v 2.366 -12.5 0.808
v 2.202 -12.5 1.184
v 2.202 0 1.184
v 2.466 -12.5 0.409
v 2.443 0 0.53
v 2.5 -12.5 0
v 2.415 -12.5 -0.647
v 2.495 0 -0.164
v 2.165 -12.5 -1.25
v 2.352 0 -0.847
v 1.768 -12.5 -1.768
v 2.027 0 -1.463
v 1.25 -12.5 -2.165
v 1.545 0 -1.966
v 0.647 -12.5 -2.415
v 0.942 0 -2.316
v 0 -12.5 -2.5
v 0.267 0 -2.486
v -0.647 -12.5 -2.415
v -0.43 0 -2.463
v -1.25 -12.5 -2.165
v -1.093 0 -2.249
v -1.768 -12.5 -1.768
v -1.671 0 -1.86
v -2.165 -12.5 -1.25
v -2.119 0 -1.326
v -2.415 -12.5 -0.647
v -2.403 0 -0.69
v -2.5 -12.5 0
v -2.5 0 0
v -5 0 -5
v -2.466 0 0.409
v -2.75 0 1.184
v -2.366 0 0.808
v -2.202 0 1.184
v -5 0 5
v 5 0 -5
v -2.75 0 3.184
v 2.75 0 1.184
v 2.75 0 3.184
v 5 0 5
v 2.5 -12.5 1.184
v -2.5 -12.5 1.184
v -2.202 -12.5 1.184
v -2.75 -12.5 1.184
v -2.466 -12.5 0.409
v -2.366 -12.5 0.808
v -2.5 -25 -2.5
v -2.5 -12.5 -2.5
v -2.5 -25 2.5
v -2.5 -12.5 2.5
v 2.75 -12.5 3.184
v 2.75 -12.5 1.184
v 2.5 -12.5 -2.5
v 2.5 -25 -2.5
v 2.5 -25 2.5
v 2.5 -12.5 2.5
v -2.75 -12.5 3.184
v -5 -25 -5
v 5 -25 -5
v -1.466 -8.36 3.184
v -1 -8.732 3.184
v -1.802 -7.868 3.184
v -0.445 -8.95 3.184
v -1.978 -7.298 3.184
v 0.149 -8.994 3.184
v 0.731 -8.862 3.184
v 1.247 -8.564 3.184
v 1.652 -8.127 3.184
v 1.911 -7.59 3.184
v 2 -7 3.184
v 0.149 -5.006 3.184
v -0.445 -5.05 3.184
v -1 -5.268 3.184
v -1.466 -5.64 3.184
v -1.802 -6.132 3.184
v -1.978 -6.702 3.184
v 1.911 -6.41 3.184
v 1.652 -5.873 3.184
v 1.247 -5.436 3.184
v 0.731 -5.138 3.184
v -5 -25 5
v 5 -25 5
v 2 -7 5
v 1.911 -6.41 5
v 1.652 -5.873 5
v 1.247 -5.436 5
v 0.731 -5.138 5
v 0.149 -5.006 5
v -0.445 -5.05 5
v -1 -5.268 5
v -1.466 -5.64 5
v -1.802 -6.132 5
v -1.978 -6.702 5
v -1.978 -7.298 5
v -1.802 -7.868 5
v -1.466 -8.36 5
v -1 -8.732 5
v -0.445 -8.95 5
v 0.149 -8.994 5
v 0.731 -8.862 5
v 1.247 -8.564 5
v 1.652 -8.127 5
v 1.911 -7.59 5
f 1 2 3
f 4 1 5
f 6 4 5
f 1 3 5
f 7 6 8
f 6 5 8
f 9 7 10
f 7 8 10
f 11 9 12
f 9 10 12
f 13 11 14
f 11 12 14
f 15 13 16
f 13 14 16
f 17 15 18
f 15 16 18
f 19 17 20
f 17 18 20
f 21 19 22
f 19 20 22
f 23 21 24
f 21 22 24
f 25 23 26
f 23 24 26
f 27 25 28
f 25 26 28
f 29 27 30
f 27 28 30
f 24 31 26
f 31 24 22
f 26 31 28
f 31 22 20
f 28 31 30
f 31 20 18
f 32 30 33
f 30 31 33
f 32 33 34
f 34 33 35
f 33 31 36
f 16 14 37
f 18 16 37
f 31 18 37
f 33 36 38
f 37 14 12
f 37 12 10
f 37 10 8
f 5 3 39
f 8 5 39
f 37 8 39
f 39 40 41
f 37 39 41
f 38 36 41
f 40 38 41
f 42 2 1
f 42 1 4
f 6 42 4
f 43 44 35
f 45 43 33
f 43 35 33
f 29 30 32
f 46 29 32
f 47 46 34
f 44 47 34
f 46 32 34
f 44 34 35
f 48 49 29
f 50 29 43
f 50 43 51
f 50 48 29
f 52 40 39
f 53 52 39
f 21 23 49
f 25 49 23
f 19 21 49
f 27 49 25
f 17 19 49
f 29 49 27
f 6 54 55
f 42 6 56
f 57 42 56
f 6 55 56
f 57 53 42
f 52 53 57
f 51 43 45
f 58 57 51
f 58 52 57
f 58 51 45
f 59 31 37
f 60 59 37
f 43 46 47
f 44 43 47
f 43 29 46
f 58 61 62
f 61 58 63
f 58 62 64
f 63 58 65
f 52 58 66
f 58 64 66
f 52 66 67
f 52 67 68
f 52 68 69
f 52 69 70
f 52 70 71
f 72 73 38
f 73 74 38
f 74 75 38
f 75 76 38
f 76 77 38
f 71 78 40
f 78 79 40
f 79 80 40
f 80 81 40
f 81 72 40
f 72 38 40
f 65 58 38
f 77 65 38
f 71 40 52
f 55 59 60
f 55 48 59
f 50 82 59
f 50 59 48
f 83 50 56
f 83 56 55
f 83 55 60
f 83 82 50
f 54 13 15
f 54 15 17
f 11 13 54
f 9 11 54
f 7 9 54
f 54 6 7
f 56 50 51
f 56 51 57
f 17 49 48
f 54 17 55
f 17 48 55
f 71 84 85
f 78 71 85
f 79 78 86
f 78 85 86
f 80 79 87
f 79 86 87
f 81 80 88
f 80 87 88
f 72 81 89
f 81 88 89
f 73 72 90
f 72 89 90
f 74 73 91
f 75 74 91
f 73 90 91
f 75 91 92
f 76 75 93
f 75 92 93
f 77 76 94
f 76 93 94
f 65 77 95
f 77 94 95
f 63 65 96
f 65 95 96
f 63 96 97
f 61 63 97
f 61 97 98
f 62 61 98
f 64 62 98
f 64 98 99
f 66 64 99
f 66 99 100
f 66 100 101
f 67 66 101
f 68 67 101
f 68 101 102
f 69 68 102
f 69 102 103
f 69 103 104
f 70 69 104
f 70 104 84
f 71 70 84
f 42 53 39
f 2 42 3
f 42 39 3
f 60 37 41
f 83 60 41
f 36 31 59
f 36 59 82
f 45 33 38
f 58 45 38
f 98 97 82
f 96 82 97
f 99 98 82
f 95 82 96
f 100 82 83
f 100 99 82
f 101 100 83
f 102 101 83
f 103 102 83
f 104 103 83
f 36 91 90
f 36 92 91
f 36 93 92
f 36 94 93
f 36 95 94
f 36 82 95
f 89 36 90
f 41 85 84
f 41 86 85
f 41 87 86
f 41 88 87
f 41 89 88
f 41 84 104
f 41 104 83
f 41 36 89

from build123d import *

# Parameters (mm, degrees)
F0_W     = 10
F0_H     = 10
F1_DEPTH = 25
F2_W     = 5
F2_H     = 5
F3_DEPTH = 12.5
F5_DEPTH = 12.5
F6_R     = 2
F7_DEPTH = 5


with BuildPart() as f1:
    # F0 (on Front) → F1 (new body)
    with BuildSketch(Plane.XZ):
        Rectangle(F0_W, F0_H)
    extrude(amount=F1_DEPTH)

    # F2 (on face) → F3 (cut)
    with BuildSketch(Plane.XZ.offset(25)):
        Rectangle(F2_W, F2_H)
    extrude(amount=-F3_DEPTH, mode=Mode.SUBTRACT)

    # F4 (on face) → F5 (cut)
    with BuildSketch(Plane(origin=(0, 0, 0), x_dir=(-1, 0, 0), z_dir=(0, 1, 0))):
        with BuildLine():
            Line((-2.2017970471, 1.1840987136), (2.2017970471, 1.1840987136))
            ThreePointArc((2.2017970471, 1.1840987136), (0, 2.5), (-2.2017970471, 1.1840987136))
        make_face()
        with BuildLine():
            ThreePointArc((-2.2017970471, 1.1840987136), (-0.6105355773, -2.4243032626), (2.5, 0))
            ThreePointArc((2.5, 0), (2.4243032626, 0.6105355773), (2.2017970471, 1.1840987136))
            Line((2.2017970471, 1.1840987136), (-2.2017970471, 1.1840987136))
        make_face()
        with BuildLine():
            ThreePointArc((-2.2017970471, 1.1840987136), (0, 2.5), (2.2017970471, 1.1840987136))
            Line((2.2017970471, 1.1840987136), (2.75, 1.1840987136))
            Line((2.75, 1.1840987136), (2.75, 3.1840987136))
            Line((2.75, 3.1840987136), (-2.75, 3.1840987136))
            Line((-2.75, 3.1840987136), (-2.75, 1.1840987136))
            Line((-2.75, 1.1840987136), (-2.2017970471, 1.1840987136))
        make_face()
    extrude(amount=-F5_DEPTH, mode=Mode.SUBTRACT)

    # F6 (on face) → F7 (cut)
    with BuildSketch(Plane.XY.offset(5)):
        with Locations((0, -7)):
            Circle(F6_R)
    extrude(amount=-F7_DEPTH, mode=Mode.SUBTRACT)


solid = f1.part
